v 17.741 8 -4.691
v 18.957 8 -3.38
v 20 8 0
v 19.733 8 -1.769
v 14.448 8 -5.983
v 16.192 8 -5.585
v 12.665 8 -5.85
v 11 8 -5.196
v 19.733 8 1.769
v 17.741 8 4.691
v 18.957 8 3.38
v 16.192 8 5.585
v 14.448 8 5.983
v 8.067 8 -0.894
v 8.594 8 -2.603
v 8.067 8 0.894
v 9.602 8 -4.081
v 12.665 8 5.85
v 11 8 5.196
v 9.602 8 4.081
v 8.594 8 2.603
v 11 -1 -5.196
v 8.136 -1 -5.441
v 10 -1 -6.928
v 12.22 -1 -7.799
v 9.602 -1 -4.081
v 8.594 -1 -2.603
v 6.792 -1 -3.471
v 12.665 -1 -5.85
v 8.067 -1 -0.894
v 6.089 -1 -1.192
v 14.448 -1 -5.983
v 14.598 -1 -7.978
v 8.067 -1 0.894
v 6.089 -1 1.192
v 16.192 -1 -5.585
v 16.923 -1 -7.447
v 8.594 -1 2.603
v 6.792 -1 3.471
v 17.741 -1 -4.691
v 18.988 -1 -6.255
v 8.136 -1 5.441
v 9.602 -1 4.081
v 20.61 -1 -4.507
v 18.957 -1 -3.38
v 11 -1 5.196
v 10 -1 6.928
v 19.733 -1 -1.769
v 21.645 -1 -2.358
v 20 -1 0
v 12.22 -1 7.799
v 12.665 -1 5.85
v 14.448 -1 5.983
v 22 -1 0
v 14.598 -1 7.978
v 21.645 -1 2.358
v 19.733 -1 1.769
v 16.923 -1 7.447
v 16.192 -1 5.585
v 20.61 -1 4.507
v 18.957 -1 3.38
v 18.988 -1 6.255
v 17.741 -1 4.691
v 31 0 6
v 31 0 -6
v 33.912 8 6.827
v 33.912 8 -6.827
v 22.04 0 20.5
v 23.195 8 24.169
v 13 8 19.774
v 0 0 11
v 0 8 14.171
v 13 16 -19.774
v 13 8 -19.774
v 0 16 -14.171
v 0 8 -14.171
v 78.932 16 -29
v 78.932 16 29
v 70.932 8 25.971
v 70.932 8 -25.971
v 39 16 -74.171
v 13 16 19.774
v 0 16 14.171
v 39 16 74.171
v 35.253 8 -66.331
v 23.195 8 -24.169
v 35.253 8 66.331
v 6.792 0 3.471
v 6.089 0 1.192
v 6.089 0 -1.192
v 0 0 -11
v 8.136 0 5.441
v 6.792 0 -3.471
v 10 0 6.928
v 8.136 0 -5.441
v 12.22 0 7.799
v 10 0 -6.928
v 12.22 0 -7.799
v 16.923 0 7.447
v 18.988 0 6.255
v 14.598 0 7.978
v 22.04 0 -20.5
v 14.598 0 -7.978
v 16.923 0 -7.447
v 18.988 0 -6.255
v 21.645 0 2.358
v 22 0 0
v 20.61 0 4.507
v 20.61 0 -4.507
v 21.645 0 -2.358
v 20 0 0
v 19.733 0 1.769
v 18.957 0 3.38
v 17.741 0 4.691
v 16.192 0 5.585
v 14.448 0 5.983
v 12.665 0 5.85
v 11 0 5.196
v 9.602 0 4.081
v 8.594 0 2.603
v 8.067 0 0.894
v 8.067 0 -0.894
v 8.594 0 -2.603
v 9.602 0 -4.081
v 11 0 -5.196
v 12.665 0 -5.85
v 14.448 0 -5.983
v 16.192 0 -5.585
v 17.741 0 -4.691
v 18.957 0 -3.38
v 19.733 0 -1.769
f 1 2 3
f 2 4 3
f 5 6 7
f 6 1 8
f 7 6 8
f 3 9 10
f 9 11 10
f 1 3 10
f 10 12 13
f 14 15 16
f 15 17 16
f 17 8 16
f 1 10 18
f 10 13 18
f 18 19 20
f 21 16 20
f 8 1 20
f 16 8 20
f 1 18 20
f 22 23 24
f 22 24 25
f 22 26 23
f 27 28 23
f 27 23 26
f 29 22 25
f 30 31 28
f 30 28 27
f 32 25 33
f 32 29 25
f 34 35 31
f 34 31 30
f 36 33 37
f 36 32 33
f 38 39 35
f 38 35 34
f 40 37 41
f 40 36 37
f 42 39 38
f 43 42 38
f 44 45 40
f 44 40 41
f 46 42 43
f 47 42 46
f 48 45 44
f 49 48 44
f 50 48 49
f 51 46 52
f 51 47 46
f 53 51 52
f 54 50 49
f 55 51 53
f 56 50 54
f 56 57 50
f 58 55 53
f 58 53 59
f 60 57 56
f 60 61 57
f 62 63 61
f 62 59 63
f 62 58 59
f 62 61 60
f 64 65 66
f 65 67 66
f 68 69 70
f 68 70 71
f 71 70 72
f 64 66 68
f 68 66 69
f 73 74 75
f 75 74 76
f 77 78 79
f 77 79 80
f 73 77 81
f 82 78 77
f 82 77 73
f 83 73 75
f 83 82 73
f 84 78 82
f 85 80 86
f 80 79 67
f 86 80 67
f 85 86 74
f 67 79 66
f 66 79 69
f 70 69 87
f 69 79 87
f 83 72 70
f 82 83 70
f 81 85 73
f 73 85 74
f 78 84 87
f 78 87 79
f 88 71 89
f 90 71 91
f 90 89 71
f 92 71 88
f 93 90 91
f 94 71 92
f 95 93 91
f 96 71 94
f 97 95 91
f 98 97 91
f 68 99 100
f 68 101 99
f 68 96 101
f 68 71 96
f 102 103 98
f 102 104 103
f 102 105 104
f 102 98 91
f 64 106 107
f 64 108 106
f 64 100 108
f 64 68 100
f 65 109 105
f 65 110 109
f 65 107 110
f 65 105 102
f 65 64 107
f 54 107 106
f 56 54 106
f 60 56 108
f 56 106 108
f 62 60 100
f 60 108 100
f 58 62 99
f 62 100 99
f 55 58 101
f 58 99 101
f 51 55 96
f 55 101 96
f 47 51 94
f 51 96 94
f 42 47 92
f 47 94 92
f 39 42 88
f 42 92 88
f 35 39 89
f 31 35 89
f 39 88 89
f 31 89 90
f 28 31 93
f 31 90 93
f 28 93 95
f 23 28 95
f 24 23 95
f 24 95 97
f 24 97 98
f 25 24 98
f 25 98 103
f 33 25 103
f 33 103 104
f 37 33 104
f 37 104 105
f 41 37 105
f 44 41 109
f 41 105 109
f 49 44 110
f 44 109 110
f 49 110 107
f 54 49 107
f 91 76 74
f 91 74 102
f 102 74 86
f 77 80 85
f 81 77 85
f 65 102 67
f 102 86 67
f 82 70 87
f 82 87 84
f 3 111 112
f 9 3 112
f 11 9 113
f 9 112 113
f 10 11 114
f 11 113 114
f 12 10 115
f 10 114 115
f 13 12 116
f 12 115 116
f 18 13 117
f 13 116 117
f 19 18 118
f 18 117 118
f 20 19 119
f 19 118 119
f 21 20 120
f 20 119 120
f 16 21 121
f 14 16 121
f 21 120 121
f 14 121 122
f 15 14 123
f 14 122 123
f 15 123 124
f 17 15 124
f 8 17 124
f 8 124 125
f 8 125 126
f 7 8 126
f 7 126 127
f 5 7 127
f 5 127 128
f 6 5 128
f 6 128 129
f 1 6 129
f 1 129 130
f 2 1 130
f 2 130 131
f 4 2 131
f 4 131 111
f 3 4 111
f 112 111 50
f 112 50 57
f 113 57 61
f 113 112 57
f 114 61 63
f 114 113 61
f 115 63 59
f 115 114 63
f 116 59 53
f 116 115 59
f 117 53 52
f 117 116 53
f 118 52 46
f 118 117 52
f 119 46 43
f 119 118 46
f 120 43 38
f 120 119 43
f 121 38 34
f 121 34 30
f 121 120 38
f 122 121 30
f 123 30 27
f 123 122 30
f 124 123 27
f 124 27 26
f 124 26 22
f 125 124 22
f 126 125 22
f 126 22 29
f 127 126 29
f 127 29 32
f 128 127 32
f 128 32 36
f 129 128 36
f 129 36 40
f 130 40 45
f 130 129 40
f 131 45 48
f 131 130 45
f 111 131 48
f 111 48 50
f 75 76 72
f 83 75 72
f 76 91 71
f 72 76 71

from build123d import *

# Parameters (mm, degrees)
F1_DEPTH      = 8
F1_TAPER      = -20
F2_W          = 14.830423519
F2_H          = 54.1627034545
F3_DEPTH      = 8.0010001
F4_R          = 6
F5_DEPTH      = 8.0010001
F5_DEPTH_BACK = 77
F4_R_2        = 8
F6_DEPTH      = 1
F9_DEPTH      = 8
F10_SIZE      = 7.99999


# Not quite as in the source:
# - a fillet or chamfer is up to 0.001 mm smaller than in the source, because OpenCascade refuses the exact size
# - an extrude ends at something that could not be found from the text; its depth is read off the source's solid


with BuildPart() as f1:
    # F0 (on Front) → F1 (new body)
    with BuildSketch(Plane.XZ):
        Polygon((0, 11), (0, 0), (0, -11), (22.0397368405, -20.5), (31, -6), (31, 0), (31, 6), (22.0397368405, 20.5), align=None)
    extrude(amount=-F1_DEPTH, taper=F1_TAPER)

    # F2 (on Front) → F3 (cut, through all)
    with BuildSketch(Plane.XZ):
        with Locations((-7.4152117595, -1.4976877719)):
            Rectangle(F2_W, F2_H)
    extrude(amount=-F3_DEPTH, mode=Mode.SUBTRACT)

    # F4 (on Front) → F5 (cut, two sides)
    with BuildSketch(Plane.XZ) as f5_sk:
        with Locations((14, 0)):
            Circle(F4_R)
    extrude(amount=-F5_DEPTH, mode=Mode.SUBTRACT)
    extrude(f5_sk.sketch, amount=F5_DEPTH_BACK, mode=Mode.SUBTRACT)

    # F4 (on Front) → F6 (join)
    with BuildSketch(Plane.XZ):
        with Locations((14, 0)):
            Circle(F4_R_2)
        with Locations((14, 0)):
            Circle(F4_R, mode=Mode.SUBTRACT)
    extrude(amount=F6_DEPTH)

    # F8 (on face) → F9 (join)
    with BuildSketch(Plane(origin=(0, 8, 0), x_dir=(-1, 0, 0), z_dir=(0, 1, 0))):
        Polygon((-39, -74.1707404442), (-13, -19.7742556265), (0, -14.1707404442), (0, 14.1707404442), (-13, 19.7742556265), (-39, 74.1707404442), (-78.9322146674, 29), (-78.9322146674, -29), align=None)
    extrude(amount=F9_DEPTH)

    # F10 (size 8 in the source; OpenCascade refuses exactly that, so slightly less here)
    f10_edges = [f1.edges().sort_by_distance(p)[0] for p in [
        (58.966107, 8, 51.58537),
        (78.932215, 8, 0),
        (58.966107, 8, -51.58537),
    ]]
    chamfer(f10_edges, length=F10_SIZE)


solid = f1.part
